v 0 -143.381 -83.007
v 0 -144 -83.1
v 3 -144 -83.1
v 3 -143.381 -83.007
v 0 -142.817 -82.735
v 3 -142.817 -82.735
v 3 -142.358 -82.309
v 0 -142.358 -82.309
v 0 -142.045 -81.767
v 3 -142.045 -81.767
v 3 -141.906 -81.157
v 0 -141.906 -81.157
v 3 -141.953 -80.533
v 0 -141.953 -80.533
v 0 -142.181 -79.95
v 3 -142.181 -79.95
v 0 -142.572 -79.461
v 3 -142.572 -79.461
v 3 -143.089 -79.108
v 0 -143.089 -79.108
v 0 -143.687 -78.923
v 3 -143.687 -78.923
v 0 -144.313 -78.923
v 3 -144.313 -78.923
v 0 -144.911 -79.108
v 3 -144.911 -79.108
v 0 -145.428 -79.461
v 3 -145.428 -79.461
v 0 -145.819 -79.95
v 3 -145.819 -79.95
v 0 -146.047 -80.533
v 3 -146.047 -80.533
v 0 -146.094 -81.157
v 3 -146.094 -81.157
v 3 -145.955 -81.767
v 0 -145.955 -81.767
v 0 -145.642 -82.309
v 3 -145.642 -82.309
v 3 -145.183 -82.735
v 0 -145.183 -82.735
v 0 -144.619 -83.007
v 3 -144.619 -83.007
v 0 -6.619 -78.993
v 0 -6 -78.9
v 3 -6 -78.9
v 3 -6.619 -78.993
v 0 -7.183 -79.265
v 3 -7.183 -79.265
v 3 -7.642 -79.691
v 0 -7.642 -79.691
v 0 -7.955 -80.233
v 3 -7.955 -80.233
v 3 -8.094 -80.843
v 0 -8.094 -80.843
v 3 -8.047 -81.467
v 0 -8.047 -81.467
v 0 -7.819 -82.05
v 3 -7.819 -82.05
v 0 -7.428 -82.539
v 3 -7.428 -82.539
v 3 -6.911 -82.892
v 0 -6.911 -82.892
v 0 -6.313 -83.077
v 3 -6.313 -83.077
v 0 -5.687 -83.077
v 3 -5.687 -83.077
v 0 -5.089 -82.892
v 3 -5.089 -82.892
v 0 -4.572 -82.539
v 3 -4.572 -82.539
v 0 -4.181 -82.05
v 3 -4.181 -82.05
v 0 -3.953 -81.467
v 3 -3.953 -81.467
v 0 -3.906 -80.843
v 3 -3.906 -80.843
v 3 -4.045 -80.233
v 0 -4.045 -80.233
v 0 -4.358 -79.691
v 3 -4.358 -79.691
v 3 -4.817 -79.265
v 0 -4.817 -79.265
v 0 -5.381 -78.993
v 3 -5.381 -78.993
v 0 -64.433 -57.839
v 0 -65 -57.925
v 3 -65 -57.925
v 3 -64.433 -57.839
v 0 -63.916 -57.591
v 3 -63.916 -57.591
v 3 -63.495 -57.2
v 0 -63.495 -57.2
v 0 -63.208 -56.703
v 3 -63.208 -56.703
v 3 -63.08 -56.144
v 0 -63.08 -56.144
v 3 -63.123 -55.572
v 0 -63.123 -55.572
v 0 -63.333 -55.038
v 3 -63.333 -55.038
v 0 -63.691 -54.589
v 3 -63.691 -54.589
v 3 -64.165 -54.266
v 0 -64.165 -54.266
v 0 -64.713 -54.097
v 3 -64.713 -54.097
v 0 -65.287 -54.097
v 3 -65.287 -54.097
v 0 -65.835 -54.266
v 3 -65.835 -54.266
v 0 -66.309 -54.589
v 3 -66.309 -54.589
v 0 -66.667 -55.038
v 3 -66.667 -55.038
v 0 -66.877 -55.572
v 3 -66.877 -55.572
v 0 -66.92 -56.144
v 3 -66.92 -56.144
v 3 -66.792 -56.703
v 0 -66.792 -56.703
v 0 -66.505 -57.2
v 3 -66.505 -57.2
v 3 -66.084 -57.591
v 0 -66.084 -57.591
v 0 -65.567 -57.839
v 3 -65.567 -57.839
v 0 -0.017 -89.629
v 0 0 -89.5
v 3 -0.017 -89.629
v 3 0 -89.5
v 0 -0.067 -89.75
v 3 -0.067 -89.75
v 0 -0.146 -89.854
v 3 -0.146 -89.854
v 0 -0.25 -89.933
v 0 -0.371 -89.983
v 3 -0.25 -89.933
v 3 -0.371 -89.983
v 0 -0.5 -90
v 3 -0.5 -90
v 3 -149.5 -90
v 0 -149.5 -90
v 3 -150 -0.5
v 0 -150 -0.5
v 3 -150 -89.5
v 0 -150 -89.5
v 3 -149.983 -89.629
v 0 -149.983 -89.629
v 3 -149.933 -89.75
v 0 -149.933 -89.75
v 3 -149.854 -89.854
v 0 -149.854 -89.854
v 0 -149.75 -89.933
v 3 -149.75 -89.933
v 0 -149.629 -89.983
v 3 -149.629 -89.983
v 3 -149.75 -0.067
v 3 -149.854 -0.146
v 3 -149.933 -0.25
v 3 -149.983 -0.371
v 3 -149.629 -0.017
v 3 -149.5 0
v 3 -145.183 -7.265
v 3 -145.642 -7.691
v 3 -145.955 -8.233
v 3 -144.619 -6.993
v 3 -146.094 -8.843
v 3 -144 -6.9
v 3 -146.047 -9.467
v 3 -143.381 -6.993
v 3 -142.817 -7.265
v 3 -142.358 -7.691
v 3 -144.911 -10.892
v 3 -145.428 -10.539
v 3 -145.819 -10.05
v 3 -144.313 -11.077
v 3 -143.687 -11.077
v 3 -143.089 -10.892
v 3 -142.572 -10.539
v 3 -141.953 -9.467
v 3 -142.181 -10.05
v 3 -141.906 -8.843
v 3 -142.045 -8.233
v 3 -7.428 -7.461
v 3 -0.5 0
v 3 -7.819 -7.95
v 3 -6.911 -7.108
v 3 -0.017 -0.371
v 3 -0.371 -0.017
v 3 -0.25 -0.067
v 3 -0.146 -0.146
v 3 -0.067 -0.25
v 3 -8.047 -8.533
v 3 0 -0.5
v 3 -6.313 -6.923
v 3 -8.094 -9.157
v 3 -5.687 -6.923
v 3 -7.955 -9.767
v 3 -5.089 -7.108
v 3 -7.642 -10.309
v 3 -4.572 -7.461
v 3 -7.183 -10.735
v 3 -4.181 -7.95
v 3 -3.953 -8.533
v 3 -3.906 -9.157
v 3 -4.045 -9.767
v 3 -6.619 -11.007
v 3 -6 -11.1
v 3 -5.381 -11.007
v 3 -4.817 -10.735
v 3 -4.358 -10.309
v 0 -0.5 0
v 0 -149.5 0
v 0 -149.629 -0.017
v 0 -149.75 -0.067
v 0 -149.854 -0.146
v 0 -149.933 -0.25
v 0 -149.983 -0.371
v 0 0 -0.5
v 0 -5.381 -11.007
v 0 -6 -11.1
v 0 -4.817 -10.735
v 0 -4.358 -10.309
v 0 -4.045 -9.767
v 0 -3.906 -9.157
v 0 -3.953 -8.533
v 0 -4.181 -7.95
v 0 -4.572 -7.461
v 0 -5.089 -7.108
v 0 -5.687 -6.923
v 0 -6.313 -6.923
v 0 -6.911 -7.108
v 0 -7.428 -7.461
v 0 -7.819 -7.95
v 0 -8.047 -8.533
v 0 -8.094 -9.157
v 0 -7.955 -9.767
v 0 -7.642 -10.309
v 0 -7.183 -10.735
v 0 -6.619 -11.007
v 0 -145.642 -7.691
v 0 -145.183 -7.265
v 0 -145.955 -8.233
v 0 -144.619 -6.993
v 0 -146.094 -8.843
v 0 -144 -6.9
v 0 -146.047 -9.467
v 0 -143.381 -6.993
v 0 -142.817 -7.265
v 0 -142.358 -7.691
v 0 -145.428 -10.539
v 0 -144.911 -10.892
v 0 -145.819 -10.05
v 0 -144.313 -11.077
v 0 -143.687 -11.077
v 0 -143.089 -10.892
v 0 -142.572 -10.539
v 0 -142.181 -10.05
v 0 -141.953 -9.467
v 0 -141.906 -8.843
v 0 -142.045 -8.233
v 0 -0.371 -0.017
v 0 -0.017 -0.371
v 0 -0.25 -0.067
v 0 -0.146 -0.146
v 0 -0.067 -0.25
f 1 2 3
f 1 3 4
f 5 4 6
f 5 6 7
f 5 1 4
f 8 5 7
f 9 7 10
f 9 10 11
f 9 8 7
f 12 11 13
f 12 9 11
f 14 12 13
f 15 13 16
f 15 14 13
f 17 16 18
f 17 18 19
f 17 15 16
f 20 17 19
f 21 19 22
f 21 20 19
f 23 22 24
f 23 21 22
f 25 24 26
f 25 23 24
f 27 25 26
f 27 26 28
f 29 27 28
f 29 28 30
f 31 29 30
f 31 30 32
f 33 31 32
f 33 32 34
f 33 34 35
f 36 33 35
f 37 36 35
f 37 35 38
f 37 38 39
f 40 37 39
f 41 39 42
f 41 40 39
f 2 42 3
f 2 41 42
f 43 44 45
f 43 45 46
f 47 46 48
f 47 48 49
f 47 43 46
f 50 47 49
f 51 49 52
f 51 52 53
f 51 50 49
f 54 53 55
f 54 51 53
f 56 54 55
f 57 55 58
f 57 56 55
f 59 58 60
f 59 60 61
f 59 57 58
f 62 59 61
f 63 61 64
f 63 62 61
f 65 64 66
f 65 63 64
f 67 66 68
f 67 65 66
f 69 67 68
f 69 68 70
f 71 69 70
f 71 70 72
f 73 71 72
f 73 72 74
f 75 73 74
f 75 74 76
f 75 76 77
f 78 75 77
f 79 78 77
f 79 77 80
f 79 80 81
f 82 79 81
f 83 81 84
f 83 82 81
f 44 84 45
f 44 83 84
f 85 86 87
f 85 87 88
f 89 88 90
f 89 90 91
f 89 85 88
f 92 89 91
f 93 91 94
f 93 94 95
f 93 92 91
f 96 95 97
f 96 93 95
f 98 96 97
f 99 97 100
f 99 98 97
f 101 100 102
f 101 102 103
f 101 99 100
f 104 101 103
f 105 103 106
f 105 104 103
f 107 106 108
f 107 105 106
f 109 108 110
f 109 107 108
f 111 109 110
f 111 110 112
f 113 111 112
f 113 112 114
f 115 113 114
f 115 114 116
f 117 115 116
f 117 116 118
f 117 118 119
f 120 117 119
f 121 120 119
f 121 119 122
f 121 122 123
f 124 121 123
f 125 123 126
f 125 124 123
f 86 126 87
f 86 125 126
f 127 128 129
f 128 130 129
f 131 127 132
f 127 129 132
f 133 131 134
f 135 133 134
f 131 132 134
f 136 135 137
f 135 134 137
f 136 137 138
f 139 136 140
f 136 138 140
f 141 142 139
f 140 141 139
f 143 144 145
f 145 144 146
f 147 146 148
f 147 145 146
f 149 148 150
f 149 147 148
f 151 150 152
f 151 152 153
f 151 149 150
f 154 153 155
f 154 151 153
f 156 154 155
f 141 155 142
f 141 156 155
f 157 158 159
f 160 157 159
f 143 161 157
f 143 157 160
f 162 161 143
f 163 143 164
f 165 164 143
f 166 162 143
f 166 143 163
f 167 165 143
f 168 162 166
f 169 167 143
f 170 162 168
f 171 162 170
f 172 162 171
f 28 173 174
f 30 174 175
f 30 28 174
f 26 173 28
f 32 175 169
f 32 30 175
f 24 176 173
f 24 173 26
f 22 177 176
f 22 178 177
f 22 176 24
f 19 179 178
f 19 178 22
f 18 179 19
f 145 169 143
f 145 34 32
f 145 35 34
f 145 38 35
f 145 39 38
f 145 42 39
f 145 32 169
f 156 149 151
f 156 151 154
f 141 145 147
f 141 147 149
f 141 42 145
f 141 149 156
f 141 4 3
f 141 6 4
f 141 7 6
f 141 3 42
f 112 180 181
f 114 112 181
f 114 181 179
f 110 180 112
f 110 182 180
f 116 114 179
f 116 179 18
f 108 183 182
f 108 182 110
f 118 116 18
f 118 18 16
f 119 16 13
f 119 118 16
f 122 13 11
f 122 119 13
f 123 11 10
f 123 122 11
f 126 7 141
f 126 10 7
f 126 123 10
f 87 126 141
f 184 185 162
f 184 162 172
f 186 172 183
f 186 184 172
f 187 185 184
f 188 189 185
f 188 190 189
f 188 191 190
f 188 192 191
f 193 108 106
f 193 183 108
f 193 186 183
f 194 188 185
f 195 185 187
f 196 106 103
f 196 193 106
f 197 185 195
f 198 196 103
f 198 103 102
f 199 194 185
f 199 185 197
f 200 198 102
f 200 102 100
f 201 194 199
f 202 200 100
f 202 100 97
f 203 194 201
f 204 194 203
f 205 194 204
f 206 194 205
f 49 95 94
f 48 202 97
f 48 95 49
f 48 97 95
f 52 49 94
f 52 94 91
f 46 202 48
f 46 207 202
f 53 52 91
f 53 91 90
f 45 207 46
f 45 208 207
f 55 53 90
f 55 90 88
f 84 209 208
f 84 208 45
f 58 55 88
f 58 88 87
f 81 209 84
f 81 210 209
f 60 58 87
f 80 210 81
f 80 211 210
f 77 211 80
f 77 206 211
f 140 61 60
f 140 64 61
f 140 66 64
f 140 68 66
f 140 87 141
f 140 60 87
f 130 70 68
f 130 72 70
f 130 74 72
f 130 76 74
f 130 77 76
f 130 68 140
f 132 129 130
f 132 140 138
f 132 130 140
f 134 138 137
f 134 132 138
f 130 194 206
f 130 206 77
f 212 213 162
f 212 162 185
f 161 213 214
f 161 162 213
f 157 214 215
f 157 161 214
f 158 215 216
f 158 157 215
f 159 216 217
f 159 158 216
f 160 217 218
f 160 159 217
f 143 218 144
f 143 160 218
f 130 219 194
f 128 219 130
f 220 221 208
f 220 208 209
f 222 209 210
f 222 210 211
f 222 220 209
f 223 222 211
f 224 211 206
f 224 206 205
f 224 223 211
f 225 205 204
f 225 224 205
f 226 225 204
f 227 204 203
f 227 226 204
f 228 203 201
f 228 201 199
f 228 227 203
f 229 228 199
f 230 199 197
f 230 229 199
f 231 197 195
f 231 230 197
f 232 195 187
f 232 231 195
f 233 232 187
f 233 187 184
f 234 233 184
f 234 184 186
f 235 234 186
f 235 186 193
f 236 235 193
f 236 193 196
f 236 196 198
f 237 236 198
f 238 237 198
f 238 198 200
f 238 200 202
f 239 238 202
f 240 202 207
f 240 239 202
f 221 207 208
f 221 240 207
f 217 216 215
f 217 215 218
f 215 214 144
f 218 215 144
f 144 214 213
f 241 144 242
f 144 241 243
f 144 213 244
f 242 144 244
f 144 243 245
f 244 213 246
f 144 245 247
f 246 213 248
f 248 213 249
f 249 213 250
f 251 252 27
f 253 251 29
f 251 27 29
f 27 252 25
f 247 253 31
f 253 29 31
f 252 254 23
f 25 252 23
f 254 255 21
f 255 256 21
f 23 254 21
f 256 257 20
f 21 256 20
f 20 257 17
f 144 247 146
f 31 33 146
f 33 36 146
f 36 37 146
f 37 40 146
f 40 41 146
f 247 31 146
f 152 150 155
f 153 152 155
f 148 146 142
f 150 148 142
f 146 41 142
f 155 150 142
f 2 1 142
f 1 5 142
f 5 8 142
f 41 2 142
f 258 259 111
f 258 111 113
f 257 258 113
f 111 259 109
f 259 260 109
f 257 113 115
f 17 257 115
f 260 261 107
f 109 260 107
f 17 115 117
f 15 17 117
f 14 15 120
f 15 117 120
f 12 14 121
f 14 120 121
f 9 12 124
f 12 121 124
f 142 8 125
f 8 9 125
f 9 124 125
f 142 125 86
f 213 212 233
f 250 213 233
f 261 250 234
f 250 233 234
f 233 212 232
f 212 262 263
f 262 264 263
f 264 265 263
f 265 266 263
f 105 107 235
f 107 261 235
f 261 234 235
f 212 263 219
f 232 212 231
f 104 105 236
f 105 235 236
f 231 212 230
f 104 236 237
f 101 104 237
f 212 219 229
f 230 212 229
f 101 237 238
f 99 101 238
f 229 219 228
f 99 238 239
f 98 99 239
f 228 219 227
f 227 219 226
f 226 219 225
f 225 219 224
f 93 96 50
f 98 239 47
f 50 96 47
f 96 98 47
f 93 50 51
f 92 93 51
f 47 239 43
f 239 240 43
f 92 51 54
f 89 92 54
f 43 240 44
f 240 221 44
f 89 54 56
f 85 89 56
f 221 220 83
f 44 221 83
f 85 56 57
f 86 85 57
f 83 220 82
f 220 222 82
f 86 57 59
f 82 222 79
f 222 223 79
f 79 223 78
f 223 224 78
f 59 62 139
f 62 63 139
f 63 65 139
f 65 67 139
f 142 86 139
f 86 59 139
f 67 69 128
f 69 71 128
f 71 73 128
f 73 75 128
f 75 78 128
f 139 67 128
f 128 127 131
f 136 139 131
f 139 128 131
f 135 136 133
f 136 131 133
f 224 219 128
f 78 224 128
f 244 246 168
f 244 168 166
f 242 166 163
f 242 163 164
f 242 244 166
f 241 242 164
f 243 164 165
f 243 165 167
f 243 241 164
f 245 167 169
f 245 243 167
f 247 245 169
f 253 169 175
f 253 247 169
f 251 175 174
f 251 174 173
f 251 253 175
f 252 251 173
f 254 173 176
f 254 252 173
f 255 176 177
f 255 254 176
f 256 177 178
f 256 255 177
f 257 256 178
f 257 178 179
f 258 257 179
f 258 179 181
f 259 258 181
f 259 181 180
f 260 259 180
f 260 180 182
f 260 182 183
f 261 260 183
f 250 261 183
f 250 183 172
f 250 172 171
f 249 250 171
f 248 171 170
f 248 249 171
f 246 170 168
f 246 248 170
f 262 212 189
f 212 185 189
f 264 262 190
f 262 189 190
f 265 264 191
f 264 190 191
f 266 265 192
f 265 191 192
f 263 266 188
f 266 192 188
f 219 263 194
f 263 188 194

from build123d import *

# Parameters (mm, degrees)
SKETCH1_W           = 90
SKETCH1_H           = 150
SKETCH1_R           = 1.925
SKETCH1_R_2         = 2.1
BOSS_EXTRUDE1_DEPTH = 3
FILLET1_R           = 0.5


with BuildPart() as part:
    # Sketch1 → Boss-Extrude1 (new body)
    with BuildSketch(Plane(origin=(0, 0, 0), x_dir=(0, 0, -1), z_dir=(1, 0, 0))):
        with Locations((45, -75)):
            Rectangle(SKETCH1_W, SKETCH1_H)
        with Locations((56, -65)):
            Circle(SKETCH1_R, mode=Mode.SUBTRACT)
        with Locations((9, -6)):
            Circle(SKETCH1_R_2, mode=Mode.SUBTRACT)
        with Locations(Location((81, -6, 0), (0, 0, 180))):
            Circle(SKETCH1_R_2, mode=Mode.SUBTRACT)
        with Locations((81, -144)):
            Circle(SKETCH1_R_2, mode=Mode.SUBTRACT)
        with Locations(Location((9, -144, 0), (0, 0, 180))):
            Circle(SKETCH1_R_2, mode=Mode.SUBTRACT)
    extrude(amount=BOSS_EXTRUDE1_DEPTH)

    # Fillet1
    fillet1_edges = [part.edges().sort_by_distance(p)[0] for p in [
        (1.5, 0, 0),
        (1.5, 0, -90),
        (1.5, -150, -90),
        (1.5, -150, 0),
    ]]
    fillet(fillet1_edges, radius=FILLET1_R)


solid = part.part
